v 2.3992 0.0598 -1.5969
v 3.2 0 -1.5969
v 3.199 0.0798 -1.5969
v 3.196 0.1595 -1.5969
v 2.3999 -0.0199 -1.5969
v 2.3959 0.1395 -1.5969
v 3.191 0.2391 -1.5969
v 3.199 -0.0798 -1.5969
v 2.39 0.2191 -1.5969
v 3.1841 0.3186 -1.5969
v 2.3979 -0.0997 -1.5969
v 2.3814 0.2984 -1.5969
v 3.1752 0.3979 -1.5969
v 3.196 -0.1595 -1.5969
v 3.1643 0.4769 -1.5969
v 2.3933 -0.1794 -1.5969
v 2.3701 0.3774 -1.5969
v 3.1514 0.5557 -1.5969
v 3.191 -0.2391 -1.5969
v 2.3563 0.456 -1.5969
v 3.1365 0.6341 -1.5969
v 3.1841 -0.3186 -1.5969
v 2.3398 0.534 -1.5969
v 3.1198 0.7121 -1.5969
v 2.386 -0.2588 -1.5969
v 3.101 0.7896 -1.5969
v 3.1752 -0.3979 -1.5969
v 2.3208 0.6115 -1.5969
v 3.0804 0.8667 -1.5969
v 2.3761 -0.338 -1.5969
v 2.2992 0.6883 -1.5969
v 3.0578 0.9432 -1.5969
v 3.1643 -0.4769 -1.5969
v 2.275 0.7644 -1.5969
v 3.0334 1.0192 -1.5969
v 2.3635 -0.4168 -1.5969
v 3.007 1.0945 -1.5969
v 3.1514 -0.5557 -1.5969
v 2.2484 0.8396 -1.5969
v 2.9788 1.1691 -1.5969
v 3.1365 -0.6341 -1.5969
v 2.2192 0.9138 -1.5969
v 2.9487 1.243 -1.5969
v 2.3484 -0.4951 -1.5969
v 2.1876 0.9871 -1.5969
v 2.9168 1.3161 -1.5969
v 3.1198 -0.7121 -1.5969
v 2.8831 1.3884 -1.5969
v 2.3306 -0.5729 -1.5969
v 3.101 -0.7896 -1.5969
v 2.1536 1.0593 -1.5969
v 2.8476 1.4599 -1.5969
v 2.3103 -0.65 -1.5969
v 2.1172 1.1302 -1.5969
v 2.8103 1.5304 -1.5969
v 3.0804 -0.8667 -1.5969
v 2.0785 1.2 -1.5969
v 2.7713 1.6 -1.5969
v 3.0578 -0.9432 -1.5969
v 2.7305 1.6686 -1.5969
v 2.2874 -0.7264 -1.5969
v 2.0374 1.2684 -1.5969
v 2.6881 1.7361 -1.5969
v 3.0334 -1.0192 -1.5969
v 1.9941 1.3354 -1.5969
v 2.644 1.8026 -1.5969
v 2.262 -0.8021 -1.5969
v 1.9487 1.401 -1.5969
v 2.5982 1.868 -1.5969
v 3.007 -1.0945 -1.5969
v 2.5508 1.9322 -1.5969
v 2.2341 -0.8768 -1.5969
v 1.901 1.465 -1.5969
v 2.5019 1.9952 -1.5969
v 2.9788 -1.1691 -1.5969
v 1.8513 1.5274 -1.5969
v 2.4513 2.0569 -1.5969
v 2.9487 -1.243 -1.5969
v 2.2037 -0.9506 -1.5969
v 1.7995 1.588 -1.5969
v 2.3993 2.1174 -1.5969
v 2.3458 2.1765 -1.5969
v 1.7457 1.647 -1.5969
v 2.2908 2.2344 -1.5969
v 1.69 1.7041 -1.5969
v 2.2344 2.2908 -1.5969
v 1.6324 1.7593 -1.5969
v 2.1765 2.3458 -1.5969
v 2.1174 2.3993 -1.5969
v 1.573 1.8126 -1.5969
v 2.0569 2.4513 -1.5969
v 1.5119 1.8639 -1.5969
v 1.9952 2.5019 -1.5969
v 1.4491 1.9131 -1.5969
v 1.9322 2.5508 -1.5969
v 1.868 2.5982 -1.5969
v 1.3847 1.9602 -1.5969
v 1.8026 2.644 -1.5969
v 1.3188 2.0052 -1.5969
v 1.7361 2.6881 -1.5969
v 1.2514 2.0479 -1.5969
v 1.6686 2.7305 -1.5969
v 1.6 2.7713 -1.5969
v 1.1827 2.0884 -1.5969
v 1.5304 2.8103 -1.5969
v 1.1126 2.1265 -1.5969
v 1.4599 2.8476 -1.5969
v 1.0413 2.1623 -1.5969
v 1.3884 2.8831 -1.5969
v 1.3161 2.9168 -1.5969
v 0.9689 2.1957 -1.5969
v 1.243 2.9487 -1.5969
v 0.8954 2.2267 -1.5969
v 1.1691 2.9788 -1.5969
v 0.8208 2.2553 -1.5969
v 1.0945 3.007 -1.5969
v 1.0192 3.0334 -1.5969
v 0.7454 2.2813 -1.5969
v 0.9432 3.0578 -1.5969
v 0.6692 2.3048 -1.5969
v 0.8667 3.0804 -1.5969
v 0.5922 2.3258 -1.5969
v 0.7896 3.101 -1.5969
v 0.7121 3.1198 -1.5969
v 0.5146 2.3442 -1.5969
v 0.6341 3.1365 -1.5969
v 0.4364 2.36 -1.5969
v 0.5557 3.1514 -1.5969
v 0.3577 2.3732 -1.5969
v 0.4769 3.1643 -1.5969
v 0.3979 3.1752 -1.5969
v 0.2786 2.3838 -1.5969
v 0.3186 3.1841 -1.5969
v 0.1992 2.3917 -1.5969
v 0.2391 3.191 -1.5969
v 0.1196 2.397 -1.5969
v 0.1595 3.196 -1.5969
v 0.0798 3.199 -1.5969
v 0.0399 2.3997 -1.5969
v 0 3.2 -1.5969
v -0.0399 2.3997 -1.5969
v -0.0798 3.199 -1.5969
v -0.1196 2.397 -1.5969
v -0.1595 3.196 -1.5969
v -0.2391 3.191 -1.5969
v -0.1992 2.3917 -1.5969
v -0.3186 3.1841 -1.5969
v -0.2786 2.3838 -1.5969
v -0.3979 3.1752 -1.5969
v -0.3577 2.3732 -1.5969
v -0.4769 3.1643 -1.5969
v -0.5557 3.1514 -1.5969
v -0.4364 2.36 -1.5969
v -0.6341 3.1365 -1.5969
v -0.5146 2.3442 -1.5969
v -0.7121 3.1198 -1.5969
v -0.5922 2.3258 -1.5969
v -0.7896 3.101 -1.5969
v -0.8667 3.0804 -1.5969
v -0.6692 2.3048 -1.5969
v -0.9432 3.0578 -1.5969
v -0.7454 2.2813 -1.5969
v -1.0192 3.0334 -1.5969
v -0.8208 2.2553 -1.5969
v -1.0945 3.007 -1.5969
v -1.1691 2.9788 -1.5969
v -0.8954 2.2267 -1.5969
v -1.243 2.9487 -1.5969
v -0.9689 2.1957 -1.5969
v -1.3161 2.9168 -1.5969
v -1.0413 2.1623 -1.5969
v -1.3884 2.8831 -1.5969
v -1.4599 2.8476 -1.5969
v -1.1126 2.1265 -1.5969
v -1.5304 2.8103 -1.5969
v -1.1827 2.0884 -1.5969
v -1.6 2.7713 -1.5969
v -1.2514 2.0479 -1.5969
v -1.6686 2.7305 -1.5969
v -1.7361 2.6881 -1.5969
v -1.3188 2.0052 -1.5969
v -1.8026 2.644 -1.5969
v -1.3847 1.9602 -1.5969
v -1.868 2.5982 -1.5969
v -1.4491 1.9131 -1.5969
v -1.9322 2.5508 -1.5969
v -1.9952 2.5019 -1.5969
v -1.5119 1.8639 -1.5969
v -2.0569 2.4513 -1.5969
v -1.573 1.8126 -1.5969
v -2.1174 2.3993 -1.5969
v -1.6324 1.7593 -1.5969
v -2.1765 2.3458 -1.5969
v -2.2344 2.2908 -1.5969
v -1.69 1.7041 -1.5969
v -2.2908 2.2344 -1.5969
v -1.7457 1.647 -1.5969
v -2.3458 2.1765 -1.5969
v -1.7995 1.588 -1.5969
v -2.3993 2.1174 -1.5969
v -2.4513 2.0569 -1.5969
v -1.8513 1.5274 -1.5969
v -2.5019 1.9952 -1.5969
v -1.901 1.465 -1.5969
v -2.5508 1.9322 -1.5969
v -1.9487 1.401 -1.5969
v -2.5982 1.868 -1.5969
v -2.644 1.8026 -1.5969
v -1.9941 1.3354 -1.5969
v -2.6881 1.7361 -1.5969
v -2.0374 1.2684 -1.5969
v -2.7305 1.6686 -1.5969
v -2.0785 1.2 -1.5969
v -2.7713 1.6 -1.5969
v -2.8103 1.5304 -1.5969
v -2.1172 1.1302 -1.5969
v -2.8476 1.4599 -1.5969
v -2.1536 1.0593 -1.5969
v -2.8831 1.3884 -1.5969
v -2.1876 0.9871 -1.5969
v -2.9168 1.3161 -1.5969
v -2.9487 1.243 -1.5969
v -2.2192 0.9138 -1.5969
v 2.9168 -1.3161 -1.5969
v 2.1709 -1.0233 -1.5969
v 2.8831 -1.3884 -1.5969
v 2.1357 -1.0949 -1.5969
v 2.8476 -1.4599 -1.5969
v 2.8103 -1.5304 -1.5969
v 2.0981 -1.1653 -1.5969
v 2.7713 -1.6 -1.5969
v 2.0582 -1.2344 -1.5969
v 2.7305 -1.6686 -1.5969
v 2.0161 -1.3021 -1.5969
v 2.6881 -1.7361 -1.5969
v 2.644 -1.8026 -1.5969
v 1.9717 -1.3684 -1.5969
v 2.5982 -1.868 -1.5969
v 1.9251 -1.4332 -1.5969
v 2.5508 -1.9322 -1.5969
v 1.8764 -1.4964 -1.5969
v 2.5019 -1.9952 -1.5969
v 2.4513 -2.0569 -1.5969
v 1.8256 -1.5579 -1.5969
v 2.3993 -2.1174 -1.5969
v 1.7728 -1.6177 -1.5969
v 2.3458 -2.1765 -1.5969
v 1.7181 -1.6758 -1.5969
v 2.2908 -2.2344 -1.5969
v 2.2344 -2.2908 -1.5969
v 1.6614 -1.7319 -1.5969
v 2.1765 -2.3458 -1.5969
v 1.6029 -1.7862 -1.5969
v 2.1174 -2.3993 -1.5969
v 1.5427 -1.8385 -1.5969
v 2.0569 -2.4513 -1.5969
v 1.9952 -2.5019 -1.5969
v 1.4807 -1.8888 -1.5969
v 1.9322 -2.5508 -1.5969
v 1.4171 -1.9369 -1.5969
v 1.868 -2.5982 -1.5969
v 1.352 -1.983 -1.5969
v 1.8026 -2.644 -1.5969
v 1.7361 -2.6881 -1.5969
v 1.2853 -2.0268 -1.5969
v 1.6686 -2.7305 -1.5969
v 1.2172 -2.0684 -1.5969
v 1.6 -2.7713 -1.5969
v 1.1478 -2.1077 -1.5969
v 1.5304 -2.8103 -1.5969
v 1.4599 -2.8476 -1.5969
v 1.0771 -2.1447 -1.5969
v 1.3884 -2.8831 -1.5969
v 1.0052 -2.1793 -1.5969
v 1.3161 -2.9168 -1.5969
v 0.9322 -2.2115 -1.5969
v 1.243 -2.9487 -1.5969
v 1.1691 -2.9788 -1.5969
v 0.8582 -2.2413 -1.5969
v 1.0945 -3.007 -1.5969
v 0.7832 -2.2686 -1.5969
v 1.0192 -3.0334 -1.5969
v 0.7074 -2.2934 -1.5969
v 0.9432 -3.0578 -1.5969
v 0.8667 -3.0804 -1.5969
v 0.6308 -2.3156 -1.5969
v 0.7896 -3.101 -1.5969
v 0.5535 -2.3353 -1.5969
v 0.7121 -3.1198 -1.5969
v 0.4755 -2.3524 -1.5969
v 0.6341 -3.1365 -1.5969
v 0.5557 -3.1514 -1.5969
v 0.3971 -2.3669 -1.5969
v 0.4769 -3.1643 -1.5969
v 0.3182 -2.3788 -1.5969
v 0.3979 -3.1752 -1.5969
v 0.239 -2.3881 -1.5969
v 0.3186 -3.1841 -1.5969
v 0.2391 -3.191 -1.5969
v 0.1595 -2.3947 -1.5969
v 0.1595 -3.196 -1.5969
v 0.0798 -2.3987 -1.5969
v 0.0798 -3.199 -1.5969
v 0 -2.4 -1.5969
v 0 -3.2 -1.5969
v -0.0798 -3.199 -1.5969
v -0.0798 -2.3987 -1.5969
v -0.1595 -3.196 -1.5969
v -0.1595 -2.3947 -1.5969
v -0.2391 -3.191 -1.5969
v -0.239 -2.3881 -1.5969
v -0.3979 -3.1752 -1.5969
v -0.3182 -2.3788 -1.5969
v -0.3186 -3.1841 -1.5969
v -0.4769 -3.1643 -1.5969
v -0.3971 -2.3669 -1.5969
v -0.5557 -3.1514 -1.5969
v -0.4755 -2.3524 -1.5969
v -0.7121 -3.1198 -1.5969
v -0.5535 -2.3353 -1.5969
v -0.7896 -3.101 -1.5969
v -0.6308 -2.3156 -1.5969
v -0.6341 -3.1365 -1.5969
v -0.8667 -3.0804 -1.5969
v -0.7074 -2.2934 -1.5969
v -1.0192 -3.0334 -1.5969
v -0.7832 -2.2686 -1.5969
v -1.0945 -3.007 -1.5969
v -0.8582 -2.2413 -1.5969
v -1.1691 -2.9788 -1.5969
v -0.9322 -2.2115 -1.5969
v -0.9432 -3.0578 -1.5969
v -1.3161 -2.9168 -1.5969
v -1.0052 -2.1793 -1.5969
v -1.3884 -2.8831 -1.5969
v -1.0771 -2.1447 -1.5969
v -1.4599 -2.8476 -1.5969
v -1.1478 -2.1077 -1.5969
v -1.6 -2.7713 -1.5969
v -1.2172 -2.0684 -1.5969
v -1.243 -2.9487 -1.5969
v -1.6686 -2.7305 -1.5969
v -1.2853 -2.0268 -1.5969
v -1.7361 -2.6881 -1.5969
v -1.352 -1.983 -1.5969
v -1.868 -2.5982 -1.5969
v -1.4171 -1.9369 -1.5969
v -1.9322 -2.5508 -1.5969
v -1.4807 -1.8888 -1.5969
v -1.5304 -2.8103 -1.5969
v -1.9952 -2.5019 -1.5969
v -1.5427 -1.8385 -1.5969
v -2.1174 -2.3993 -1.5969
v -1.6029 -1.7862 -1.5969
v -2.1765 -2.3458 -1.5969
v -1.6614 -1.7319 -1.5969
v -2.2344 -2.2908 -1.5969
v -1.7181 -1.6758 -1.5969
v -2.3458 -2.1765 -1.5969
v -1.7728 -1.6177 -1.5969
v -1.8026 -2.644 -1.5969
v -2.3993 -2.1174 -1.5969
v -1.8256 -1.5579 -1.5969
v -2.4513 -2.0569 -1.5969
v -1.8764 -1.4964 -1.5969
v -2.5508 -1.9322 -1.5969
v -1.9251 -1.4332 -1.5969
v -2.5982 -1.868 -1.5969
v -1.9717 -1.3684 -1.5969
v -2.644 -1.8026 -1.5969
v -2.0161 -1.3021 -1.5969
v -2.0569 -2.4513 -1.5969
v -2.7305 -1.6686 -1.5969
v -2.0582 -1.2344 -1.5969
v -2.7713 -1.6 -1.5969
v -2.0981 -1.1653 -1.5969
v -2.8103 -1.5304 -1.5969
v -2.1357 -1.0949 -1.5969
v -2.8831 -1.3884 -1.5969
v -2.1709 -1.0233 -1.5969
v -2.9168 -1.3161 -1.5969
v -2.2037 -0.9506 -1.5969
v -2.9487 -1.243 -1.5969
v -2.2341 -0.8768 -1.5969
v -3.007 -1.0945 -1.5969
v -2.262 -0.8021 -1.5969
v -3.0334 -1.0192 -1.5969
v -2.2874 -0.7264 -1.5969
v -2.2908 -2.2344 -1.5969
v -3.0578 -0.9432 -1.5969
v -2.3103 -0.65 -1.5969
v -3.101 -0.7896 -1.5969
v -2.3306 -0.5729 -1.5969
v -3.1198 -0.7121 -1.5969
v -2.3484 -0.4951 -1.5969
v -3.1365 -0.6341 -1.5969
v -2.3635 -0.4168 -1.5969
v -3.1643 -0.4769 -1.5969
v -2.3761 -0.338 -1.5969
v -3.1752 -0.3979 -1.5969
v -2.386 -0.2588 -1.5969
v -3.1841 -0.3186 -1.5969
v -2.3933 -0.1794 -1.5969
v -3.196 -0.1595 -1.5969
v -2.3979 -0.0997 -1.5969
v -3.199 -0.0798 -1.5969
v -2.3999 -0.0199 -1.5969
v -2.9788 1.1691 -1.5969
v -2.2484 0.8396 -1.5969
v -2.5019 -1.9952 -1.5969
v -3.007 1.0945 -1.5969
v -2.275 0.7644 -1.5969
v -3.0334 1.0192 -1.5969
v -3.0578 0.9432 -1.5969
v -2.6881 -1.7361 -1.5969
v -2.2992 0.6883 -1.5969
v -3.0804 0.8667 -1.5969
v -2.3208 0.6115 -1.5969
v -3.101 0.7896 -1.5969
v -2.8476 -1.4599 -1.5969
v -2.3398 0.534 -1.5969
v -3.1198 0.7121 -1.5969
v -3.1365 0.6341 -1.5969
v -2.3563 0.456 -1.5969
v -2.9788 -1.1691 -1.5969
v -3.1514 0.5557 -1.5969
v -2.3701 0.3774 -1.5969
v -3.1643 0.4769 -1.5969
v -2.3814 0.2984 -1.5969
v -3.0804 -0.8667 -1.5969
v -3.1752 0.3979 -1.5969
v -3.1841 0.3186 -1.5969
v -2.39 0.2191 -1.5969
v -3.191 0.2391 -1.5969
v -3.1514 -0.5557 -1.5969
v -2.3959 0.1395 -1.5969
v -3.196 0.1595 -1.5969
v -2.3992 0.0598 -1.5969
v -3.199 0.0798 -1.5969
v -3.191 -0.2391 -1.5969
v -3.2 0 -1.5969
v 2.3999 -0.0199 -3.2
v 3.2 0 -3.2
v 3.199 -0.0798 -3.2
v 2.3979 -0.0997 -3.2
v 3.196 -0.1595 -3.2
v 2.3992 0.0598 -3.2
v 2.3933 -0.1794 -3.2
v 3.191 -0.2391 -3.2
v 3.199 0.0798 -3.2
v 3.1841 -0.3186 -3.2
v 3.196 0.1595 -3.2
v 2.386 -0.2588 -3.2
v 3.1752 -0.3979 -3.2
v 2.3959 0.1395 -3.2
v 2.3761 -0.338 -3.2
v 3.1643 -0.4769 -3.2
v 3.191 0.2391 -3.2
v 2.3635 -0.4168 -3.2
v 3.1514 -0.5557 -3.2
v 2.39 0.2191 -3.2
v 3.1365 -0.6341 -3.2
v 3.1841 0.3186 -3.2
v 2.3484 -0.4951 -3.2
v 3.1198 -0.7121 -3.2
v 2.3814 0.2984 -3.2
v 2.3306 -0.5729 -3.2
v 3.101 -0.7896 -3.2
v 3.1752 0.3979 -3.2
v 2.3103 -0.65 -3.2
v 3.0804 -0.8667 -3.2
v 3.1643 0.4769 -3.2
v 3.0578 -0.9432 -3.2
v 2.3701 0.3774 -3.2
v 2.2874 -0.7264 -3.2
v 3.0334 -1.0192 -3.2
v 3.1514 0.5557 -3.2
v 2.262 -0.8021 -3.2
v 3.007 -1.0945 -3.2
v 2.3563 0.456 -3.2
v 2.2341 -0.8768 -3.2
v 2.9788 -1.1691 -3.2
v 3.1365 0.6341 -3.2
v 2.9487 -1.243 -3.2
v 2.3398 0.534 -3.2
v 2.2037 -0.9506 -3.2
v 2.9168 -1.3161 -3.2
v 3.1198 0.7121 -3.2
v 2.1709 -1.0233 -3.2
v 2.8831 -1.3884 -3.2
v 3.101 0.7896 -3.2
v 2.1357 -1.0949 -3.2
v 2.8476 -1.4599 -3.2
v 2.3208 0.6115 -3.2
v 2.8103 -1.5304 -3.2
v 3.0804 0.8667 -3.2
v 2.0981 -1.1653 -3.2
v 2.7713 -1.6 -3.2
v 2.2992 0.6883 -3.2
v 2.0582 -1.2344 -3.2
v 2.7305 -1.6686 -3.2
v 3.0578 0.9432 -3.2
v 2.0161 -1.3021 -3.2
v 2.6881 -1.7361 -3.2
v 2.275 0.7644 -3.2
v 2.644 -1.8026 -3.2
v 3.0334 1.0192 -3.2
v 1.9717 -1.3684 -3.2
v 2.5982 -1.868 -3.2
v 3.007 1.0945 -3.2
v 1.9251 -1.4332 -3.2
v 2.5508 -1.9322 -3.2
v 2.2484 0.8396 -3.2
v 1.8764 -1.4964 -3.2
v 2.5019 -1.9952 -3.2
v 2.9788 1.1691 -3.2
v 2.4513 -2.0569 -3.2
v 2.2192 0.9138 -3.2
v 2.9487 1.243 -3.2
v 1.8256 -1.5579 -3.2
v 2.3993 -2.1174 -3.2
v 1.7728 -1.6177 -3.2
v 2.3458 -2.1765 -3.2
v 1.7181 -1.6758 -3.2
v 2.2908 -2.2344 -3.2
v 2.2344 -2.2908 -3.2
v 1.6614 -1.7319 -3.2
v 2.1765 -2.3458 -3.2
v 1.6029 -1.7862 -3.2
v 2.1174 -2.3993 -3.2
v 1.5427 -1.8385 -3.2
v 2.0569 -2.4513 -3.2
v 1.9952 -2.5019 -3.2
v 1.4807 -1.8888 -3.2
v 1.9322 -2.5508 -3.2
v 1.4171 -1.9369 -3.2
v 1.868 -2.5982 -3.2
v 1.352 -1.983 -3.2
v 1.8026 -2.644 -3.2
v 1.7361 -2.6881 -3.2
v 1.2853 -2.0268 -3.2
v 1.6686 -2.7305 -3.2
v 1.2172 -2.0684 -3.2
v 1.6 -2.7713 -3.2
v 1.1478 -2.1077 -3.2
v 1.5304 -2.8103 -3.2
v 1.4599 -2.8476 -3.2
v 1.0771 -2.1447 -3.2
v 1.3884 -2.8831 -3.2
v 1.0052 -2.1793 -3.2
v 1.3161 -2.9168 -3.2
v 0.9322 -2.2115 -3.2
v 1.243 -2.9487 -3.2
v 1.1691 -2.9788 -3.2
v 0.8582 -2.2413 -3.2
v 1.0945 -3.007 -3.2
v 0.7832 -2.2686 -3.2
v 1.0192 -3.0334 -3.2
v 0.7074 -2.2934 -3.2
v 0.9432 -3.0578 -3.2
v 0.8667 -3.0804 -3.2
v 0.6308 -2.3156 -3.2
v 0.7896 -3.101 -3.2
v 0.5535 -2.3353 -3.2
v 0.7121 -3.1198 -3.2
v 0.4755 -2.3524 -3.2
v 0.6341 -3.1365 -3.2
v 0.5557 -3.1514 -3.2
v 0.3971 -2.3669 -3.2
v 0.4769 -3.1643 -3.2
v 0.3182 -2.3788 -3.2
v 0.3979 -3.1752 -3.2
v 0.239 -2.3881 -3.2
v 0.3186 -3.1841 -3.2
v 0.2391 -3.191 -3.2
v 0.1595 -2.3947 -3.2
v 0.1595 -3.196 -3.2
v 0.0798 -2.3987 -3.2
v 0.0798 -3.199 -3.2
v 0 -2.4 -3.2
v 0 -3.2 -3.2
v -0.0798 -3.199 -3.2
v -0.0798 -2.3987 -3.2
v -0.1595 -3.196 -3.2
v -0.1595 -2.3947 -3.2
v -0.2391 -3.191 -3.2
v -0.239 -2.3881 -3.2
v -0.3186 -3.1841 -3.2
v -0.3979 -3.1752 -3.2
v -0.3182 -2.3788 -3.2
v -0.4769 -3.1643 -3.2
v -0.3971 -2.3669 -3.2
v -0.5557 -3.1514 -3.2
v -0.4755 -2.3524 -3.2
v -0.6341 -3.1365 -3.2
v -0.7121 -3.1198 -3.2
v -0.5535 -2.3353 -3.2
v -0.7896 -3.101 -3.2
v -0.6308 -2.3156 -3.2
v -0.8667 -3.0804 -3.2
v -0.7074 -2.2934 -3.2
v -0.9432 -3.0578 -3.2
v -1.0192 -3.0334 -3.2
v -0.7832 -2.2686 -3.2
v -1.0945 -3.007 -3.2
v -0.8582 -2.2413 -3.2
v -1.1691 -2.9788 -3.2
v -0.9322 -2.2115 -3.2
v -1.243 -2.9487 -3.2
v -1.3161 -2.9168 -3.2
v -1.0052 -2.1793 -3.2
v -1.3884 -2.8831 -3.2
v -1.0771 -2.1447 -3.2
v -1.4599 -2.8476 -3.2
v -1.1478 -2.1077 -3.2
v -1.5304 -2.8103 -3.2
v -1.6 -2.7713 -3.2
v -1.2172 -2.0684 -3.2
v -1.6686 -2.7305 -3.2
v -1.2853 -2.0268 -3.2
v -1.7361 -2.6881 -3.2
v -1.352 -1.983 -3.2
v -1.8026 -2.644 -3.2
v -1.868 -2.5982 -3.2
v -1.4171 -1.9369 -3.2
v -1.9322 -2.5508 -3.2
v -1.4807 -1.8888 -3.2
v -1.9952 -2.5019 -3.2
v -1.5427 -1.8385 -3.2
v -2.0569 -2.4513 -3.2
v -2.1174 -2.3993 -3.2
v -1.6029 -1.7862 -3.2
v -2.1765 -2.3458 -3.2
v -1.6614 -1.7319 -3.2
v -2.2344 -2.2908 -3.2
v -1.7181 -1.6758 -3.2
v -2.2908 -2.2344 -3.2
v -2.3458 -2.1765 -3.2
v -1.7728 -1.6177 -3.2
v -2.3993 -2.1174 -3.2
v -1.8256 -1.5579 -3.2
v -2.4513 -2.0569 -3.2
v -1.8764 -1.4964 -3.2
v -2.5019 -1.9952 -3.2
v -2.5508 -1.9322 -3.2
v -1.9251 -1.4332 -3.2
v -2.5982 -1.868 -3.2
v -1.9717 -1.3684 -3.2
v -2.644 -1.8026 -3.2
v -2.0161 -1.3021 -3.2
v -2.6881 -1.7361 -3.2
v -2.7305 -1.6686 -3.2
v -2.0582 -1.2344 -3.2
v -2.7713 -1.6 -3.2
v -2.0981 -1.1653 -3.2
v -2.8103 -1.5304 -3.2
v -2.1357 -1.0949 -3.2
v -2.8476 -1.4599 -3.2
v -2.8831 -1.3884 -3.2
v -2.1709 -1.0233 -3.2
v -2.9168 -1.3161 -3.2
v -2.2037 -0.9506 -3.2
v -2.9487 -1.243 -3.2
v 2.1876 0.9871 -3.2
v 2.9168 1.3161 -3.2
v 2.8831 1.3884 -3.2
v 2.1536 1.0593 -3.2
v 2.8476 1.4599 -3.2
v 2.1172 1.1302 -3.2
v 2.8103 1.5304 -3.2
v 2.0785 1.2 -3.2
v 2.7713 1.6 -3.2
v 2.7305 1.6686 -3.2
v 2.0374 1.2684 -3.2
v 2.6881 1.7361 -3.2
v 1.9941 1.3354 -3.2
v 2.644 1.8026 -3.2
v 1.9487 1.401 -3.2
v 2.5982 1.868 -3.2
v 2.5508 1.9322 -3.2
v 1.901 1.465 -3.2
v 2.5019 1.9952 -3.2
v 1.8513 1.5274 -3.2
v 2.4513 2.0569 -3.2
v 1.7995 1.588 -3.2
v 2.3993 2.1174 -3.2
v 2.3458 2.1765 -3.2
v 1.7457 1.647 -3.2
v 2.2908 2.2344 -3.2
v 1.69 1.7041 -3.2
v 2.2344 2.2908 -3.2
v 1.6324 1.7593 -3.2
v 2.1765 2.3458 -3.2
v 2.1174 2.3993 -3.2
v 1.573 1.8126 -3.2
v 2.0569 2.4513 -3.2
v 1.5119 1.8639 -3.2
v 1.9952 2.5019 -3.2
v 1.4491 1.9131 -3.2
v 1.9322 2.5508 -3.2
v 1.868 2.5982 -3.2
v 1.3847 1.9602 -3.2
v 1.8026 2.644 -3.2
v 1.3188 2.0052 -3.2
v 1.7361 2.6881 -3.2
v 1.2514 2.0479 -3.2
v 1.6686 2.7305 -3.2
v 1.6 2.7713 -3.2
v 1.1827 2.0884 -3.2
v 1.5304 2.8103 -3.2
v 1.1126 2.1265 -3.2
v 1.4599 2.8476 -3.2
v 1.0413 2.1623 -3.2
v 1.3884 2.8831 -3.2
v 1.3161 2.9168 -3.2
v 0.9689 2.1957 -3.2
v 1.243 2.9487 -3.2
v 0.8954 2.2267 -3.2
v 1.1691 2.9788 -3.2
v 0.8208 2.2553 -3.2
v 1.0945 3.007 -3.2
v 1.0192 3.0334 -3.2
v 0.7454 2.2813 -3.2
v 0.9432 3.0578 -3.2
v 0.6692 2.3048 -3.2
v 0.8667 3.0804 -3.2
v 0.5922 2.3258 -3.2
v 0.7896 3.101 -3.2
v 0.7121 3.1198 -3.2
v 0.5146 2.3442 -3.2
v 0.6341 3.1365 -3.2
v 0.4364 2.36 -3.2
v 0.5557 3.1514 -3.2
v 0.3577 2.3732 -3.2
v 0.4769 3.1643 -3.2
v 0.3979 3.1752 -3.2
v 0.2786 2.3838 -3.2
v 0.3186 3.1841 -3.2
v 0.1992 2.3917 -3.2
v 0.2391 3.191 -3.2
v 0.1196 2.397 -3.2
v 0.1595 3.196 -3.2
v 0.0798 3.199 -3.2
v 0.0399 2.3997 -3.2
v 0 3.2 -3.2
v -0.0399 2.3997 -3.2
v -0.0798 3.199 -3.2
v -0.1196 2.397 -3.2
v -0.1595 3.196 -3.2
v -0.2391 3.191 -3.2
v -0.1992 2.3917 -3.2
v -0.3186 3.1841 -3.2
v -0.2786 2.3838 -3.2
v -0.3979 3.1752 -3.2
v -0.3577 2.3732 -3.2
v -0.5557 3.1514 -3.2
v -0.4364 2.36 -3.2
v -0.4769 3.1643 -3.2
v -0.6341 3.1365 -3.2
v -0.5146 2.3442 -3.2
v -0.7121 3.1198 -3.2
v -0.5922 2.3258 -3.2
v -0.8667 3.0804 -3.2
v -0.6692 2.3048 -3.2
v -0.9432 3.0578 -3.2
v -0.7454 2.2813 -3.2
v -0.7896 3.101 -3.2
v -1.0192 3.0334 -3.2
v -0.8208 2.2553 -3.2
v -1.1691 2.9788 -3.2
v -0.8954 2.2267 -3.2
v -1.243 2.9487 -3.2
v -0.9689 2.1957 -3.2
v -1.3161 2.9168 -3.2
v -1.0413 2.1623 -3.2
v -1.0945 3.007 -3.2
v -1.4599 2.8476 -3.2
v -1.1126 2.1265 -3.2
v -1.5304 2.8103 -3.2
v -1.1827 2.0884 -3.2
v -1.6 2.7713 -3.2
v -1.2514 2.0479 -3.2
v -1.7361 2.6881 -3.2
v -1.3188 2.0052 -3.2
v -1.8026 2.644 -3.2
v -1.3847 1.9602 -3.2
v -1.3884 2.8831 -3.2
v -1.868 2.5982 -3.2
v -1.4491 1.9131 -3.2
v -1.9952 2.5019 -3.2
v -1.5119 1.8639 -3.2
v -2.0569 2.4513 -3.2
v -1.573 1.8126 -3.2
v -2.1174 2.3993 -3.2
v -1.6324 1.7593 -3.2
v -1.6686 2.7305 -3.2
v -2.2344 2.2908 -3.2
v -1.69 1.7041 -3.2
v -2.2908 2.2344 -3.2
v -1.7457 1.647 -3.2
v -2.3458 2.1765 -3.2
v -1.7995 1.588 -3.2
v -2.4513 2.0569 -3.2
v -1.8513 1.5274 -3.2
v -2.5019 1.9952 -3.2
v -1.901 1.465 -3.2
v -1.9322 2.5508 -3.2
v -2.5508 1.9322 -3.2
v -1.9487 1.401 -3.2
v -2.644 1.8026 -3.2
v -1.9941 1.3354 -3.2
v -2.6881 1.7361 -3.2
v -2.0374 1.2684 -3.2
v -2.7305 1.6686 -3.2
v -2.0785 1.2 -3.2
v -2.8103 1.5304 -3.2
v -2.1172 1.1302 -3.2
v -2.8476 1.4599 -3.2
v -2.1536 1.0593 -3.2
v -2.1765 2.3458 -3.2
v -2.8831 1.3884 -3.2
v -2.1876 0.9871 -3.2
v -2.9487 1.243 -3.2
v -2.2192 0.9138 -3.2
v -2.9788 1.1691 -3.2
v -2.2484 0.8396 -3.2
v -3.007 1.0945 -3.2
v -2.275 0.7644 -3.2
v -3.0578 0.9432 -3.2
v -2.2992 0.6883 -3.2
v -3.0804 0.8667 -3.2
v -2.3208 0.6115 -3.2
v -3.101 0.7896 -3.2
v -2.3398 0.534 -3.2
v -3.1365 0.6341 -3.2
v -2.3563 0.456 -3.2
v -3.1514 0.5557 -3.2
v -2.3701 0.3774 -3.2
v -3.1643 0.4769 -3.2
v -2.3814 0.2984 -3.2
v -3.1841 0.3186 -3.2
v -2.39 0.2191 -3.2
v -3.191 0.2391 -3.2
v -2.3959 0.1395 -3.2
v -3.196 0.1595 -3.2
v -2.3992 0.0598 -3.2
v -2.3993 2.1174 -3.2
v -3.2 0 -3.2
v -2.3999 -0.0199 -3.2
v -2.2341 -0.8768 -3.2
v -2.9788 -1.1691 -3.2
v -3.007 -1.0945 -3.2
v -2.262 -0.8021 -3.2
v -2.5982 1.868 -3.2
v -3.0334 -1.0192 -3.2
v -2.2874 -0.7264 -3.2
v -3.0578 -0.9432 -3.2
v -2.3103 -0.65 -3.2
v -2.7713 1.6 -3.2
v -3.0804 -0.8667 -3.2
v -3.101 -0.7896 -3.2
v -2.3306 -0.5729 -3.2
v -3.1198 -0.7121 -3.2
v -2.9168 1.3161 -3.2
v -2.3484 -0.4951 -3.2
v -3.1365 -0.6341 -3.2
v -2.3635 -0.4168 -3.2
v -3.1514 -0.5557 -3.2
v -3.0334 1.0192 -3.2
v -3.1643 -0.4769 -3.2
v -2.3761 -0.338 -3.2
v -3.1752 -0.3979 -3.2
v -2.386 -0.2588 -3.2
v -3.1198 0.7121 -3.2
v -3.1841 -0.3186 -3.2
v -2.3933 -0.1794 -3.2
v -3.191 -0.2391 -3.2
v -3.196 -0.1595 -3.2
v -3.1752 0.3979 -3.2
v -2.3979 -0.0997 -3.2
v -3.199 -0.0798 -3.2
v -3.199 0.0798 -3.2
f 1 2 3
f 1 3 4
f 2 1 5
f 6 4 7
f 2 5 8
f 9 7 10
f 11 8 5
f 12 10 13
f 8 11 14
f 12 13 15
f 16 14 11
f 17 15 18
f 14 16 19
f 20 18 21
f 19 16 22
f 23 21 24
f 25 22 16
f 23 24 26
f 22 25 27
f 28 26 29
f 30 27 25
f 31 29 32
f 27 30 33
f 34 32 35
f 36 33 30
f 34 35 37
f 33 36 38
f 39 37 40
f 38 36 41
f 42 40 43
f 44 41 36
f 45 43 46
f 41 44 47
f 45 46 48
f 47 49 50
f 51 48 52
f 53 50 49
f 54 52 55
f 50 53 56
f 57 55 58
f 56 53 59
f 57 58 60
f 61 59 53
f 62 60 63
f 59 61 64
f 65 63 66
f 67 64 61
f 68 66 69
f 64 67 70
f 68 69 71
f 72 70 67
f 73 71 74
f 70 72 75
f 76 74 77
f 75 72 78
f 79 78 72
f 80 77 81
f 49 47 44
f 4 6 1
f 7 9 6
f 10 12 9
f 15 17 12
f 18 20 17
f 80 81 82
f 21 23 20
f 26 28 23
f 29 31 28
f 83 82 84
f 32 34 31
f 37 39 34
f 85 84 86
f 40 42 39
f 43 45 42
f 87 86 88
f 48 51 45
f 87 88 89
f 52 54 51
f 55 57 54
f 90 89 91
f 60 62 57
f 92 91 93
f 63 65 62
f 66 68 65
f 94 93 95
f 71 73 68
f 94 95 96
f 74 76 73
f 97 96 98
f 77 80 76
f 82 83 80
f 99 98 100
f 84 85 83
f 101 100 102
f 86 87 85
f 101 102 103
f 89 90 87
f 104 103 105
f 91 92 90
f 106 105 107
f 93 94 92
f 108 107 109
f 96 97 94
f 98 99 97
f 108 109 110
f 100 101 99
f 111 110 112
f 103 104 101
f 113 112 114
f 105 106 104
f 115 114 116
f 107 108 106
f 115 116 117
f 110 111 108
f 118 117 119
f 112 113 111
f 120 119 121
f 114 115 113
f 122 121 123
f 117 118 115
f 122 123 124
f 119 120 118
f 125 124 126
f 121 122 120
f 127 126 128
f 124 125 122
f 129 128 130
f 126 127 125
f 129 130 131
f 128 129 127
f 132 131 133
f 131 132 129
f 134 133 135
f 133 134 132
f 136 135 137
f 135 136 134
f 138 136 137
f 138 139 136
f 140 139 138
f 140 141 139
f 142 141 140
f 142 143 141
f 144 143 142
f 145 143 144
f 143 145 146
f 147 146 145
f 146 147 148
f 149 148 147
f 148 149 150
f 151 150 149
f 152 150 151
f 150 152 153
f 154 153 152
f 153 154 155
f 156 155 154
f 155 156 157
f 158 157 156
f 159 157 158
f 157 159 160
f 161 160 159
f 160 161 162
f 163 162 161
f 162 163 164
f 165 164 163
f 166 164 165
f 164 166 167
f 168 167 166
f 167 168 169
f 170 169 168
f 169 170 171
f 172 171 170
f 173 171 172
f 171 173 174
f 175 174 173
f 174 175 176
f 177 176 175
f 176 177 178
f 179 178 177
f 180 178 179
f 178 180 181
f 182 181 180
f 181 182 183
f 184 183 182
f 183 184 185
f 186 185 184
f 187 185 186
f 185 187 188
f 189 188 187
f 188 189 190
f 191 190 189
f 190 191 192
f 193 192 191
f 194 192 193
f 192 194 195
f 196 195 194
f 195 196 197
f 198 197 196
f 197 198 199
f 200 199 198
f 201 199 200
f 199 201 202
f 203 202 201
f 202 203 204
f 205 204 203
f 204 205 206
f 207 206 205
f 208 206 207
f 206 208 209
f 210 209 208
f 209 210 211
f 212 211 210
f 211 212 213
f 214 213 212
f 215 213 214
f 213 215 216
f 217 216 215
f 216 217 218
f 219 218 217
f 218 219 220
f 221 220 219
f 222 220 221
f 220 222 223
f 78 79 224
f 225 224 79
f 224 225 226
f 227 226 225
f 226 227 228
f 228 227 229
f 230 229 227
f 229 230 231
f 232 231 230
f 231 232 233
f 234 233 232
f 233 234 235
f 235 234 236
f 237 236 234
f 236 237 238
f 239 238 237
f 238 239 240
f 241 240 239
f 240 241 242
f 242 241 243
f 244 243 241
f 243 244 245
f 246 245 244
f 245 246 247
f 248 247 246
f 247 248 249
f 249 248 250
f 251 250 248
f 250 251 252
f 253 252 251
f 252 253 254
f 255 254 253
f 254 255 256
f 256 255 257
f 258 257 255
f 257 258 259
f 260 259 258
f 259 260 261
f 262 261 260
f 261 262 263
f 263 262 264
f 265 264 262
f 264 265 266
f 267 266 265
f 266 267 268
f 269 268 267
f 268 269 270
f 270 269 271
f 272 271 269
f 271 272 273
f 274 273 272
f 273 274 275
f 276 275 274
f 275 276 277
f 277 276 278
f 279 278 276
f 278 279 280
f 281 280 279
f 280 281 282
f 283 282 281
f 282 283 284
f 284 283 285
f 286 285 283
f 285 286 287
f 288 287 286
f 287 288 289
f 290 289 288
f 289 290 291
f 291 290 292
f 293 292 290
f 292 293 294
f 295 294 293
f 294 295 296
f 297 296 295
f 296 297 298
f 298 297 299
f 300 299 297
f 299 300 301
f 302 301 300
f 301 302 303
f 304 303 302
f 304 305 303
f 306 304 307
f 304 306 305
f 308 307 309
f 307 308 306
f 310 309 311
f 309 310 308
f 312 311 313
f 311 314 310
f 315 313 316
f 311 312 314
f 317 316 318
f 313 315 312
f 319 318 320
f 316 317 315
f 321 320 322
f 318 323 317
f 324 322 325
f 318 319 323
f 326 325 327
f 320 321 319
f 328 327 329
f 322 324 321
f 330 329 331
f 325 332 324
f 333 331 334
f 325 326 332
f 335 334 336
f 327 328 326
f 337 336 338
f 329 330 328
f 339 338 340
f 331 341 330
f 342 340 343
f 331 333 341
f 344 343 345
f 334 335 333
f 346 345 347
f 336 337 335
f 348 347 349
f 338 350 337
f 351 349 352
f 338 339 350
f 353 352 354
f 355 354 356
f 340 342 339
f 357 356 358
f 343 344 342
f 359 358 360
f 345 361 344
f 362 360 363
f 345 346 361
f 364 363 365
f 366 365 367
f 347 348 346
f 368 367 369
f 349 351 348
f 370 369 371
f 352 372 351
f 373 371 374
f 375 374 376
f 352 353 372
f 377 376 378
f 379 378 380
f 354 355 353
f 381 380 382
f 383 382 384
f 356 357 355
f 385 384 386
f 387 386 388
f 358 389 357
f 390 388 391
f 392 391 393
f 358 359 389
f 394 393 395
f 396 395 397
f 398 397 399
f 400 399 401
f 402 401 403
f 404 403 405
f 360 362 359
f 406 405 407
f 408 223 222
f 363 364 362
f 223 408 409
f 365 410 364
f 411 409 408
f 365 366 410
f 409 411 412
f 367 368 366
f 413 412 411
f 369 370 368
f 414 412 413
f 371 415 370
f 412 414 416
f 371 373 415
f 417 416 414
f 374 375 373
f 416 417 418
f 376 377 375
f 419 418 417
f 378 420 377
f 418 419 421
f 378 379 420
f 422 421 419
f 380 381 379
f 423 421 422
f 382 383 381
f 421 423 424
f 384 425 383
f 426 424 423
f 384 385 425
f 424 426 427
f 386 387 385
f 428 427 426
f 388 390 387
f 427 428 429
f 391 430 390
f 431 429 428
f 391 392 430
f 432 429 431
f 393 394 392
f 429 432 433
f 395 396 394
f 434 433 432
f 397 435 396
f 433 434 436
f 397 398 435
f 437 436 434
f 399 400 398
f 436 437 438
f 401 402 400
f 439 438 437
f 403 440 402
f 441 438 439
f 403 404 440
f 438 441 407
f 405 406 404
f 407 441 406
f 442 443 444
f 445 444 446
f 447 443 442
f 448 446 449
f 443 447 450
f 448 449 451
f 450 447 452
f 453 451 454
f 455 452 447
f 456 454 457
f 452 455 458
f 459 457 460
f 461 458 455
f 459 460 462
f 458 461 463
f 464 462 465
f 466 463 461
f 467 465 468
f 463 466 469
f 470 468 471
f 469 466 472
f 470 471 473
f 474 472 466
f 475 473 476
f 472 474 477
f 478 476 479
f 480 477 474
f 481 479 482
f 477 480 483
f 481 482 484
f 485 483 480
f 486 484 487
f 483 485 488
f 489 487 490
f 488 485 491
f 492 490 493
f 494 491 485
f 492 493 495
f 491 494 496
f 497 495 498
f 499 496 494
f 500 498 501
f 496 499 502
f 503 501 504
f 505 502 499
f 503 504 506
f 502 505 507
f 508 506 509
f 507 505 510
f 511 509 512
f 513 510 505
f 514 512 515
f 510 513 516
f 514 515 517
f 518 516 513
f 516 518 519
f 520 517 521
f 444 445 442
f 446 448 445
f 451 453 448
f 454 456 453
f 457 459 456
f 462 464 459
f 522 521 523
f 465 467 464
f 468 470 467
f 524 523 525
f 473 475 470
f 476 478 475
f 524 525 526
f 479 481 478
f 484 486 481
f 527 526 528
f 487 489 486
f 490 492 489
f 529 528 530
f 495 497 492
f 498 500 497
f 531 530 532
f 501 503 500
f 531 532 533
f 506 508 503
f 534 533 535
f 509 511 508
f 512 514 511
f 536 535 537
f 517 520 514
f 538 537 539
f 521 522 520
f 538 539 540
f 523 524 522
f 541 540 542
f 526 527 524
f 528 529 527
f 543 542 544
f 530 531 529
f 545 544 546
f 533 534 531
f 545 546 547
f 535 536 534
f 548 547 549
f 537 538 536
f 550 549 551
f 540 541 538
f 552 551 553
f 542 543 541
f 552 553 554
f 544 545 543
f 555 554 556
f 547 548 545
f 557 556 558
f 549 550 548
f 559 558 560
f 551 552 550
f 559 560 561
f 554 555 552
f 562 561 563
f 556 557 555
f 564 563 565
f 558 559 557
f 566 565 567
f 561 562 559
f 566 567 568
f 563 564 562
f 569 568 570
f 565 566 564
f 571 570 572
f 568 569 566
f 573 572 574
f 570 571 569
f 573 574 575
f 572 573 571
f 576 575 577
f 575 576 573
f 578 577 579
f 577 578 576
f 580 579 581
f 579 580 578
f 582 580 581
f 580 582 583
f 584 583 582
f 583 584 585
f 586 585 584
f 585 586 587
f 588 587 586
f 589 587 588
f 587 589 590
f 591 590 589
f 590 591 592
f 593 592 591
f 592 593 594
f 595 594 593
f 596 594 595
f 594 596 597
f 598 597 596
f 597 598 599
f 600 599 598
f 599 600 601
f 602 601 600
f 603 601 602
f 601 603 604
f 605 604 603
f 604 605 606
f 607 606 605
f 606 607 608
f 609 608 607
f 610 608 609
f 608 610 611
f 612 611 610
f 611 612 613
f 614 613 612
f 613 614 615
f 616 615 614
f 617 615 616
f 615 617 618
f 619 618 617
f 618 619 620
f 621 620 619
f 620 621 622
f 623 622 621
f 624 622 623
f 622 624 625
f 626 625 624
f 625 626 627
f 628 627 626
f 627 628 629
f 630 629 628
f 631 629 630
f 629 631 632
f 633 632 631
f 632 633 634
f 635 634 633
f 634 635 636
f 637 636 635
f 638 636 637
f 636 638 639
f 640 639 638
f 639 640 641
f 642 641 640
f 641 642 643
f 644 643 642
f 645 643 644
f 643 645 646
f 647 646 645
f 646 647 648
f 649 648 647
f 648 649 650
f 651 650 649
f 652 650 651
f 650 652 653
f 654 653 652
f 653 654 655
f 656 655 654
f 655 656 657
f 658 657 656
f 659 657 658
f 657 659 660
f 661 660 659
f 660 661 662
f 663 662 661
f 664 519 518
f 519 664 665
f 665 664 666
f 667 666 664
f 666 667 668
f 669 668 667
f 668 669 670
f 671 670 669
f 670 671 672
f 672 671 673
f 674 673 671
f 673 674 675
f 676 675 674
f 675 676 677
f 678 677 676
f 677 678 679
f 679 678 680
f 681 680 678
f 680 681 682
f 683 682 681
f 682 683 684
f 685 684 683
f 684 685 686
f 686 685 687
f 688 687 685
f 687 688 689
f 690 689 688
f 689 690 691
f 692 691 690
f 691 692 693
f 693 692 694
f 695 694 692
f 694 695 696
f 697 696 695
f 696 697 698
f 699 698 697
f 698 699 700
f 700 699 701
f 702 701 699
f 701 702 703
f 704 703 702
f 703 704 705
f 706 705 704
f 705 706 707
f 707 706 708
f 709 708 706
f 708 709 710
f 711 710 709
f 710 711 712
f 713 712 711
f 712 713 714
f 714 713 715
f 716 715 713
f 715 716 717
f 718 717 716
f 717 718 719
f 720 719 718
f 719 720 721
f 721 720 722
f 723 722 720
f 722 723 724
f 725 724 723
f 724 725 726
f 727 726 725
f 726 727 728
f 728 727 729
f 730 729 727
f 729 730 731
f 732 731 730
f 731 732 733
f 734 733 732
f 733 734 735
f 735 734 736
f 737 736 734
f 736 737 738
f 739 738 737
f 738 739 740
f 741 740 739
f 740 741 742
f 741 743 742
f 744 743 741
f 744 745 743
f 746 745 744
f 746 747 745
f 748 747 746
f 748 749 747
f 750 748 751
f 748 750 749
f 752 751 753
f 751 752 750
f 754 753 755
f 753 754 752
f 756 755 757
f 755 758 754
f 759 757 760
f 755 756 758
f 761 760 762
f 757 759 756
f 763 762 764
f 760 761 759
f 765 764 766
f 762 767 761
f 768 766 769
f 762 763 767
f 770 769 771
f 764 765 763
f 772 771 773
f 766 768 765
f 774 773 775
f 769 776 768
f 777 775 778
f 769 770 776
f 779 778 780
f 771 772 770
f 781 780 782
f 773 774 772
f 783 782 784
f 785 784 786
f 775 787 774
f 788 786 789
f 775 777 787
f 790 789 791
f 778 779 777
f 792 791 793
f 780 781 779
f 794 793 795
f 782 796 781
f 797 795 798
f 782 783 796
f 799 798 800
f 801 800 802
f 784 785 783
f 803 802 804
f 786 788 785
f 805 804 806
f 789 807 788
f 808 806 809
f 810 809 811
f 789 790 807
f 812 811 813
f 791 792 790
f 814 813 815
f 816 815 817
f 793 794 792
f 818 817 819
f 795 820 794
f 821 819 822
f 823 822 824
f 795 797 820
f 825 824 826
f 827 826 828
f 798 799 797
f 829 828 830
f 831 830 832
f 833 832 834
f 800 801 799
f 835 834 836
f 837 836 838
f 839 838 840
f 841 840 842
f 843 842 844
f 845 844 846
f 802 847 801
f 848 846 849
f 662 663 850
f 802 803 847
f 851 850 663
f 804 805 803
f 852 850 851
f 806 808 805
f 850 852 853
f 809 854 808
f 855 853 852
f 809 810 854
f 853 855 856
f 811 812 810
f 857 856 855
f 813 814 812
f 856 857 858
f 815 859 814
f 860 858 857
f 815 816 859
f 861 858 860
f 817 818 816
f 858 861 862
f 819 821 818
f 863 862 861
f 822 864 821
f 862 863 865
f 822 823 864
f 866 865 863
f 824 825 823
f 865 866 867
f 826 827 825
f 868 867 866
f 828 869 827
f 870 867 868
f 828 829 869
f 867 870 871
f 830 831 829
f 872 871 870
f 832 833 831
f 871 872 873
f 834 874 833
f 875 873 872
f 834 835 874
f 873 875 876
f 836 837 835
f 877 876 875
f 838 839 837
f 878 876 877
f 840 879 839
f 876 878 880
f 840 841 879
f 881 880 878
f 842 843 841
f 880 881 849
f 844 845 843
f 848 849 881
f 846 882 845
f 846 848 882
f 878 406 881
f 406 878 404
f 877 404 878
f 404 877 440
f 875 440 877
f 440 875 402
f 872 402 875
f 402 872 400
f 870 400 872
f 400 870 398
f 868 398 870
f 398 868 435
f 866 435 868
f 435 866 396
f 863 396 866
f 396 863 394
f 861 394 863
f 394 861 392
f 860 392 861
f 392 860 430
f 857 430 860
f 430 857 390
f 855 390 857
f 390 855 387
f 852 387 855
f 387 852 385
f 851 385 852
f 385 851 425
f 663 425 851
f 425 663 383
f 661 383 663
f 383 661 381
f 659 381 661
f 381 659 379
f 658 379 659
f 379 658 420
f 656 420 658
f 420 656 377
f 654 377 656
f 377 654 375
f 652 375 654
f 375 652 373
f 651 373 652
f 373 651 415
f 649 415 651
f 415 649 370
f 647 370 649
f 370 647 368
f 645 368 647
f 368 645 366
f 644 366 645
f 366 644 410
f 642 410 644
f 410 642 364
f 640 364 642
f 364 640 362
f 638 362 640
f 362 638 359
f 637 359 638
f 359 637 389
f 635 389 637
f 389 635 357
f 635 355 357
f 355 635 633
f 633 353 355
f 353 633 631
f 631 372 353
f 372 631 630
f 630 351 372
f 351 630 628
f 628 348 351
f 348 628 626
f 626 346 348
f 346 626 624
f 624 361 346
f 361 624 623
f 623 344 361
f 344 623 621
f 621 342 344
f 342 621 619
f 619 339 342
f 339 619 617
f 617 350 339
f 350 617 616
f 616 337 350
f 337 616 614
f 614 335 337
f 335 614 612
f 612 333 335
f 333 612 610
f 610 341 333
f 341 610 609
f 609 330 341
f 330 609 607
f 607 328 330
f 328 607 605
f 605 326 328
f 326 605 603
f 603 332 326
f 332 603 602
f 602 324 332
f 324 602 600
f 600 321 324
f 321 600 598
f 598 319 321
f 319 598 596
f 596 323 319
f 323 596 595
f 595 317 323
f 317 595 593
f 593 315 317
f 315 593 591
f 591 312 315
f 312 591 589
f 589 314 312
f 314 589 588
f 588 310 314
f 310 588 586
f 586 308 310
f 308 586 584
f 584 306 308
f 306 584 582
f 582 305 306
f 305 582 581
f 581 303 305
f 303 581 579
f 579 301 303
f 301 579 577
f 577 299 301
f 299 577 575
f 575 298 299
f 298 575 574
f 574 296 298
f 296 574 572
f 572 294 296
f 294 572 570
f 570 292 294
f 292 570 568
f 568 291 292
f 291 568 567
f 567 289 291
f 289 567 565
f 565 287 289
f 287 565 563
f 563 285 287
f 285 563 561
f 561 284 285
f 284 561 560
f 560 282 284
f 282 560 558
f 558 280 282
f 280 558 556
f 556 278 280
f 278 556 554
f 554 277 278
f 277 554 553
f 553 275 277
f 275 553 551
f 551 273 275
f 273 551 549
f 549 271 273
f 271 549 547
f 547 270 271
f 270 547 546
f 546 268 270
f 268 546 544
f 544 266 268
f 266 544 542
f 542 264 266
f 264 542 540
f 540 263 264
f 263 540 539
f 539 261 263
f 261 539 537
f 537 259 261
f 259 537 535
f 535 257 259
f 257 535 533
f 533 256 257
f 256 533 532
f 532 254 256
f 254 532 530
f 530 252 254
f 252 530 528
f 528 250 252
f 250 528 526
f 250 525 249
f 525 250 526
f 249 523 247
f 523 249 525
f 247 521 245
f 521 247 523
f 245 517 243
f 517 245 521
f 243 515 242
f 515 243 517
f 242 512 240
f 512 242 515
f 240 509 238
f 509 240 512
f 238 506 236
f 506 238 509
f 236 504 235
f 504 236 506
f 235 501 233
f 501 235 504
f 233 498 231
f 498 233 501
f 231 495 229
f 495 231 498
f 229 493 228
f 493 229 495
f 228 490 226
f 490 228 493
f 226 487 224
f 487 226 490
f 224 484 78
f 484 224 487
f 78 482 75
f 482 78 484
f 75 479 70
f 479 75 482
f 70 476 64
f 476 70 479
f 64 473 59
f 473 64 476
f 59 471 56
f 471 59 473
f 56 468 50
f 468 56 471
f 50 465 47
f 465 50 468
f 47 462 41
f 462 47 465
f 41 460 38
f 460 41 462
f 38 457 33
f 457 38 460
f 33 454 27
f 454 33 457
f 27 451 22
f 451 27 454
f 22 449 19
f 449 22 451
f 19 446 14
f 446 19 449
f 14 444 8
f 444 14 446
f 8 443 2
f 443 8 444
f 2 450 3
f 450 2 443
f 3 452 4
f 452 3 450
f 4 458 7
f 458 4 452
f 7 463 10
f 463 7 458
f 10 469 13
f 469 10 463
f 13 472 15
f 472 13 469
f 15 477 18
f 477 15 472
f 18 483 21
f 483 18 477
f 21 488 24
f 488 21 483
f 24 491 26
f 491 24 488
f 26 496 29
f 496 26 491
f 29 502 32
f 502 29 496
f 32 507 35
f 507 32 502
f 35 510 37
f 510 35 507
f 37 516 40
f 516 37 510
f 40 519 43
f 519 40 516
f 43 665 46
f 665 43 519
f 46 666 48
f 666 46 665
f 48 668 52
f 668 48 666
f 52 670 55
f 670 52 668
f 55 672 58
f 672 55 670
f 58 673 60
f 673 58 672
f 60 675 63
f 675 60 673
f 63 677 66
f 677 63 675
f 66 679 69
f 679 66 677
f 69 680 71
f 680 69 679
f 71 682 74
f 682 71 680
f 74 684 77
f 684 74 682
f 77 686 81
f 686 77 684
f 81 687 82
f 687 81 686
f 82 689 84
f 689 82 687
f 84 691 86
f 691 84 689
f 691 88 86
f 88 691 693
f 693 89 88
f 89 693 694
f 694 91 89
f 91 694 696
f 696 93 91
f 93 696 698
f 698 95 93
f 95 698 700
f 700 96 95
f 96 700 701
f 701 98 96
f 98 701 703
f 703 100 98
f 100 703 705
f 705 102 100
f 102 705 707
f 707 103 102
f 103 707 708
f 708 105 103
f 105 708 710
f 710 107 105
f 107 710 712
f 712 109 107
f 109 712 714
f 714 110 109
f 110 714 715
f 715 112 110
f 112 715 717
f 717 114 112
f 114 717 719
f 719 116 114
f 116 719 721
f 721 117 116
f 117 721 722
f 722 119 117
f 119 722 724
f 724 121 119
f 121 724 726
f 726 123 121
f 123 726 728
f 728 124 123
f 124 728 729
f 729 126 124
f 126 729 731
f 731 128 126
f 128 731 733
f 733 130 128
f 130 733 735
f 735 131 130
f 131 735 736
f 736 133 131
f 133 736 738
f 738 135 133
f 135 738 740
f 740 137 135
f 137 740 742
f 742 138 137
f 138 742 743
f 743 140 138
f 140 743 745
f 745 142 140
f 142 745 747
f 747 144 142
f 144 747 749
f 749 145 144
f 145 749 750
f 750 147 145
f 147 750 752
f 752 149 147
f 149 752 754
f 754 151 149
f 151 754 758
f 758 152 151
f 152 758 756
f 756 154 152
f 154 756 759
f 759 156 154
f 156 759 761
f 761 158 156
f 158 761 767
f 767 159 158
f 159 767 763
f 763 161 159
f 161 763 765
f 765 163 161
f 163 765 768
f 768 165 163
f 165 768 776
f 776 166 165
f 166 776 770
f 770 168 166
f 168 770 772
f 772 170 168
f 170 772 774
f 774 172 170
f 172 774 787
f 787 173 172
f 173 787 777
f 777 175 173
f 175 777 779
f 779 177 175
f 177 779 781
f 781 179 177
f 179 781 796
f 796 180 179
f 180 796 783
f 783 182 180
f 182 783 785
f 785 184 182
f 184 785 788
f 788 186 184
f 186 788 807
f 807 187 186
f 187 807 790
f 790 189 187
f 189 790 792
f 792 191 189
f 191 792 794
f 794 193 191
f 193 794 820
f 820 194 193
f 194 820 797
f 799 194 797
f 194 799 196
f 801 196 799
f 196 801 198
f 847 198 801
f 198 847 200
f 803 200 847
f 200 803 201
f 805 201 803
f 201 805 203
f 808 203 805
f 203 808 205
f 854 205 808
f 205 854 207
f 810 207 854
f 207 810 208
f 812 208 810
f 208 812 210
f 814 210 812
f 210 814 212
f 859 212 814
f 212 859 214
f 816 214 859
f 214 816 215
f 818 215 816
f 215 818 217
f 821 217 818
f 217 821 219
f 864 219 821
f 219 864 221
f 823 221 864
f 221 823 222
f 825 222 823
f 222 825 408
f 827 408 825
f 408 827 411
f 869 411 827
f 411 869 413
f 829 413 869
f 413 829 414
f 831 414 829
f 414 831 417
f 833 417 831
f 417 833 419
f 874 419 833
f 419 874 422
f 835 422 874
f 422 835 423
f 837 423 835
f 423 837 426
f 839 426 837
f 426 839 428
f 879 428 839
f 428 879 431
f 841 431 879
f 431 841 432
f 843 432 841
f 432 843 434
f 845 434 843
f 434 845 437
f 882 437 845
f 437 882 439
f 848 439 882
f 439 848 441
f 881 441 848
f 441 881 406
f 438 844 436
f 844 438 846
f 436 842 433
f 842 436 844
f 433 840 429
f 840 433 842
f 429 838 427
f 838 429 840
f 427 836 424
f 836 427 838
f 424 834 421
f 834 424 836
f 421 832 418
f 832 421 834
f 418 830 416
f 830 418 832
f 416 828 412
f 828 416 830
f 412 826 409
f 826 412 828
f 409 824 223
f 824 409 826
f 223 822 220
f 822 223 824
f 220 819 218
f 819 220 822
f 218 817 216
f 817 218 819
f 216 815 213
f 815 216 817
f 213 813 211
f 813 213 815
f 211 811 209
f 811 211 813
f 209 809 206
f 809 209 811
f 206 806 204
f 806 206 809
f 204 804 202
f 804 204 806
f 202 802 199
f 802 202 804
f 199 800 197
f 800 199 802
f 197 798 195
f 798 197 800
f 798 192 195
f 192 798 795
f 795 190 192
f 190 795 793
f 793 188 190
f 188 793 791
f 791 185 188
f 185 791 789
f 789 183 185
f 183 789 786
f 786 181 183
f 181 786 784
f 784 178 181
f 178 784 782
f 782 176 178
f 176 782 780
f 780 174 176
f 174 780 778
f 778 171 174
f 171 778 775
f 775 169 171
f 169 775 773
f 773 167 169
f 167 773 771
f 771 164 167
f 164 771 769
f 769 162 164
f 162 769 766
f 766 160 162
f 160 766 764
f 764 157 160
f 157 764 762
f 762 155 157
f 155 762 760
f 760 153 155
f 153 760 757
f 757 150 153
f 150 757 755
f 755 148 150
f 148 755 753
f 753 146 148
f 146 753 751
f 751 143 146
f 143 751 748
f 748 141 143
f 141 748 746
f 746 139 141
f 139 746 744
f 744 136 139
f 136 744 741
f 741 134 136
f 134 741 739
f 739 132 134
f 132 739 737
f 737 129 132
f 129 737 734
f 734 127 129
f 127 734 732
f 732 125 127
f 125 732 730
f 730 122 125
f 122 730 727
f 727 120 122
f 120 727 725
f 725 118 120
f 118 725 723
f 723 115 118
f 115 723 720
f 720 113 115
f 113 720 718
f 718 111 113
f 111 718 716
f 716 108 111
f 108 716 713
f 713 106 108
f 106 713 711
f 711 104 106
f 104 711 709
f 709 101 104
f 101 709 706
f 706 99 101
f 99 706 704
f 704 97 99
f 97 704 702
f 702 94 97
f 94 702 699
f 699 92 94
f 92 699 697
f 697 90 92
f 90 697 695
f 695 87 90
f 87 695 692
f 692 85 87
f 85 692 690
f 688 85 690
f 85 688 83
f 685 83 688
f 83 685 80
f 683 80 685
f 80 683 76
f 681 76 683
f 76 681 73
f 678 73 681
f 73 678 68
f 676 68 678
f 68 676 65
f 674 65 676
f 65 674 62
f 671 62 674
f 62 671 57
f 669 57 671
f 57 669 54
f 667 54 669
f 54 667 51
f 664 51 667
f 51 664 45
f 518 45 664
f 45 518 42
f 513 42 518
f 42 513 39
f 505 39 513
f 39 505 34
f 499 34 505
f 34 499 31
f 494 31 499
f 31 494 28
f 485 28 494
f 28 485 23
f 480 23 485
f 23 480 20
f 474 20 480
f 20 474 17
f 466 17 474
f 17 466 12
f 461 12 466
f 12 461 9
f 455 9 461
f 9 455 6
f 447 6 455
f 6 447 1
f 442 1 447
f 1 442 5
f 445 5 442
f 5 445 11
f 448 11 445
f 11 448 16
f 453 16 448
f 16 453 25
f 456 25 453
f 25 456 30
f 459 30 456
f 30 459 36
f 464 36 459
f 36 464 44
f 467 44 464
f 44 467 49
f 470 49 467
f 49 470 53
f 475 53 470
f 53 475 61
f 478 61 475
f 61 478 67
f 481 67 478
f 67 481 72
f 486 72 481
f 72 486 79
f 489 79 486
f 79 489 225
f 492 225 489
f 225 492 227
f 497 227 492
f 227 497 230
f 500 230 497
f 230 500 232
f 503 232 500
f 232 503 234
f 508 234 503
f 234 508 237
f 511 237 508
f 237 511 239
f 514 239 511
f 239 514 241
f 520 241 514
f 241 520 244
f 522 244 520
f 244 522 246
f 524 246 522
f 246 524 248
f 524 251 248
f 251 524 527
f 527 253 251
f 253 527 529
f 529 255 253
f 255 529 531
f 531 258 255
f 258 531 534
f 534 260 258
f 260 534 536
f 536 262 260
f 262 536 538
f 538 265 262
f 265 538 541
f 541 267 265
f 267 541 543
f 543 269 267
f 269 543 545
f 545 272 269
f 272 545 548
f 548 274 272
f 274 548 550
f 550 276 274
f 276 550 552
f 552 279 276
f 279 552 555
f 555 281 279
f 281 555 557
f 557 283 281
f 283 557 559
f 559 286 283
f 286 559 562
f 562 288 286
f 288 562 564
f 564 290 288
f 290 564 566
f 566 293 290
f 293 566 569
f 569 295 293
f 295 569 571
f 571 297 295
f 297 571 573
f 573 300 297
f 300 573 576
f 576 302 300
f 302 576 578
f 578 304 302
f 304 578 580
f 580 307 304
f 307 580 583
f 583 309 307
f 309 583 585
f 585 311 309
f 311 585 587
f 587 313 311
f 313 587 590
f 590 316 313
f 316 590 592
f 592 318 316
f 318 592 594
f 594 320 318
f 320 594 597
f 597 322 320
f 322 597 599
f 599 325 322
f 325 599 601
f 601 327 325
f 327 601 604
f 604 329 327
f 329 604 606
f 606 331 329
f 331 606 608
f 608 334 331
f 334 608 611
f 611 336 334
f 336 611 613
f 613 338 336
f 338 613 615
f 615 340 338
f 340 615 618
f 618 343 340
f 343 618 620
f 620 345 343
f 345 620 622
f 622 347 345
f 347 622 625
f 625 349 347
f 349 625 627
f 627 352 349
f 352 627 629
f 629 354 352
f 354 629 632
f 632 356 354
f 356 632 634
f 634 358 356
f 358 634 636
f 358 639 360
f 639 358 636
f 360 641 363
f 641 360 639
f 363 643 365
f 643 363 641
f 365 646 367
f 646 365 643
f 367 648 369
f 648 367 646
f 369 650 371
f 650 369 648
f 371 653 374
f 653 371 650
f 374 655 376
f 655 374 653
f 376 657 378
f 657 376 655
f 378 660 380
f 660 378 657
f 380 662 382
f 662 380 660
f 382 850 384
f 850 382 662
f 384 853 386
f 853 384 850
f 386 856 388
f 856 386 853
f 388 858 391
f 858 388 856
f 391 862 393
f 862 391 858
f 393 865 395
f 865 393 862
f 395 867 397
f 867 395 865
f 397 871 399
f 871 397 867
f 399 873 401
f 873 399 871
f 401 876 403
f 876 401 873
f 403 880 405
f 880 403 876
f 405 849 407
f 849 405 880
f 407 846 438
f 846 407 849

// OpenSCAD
use <../lib.scad>
use <3068b.scad>
use <6005724e2.scad>
$fa=1; $fs=0.2;
function ldraw_lib__3068bdm1(realsolid=false) = [
// 0 Tile  2 x  2 with Wood Grain and Nails Type 2 Sticker
// 0 Name: 3068bdm1.dat
// 0 Author: Christian Neumann [Wesley]
// 0 !LDRAW_ORG Shortcut UPDATE 2014-02
// 0 !LICENSE Licensed under CC BY 2.0 and CC BY 4.0 : see CAreadme.txt
// 
// 0 BFC CERTIFY CCW
  [0,"BFC","CERTIFY"],
  [0,"BFC","CCW"],
// 
// 0 !KEYWORDS Lord of the Rings, LOTR, Mines of Moria, Set 9473
// 
// 0 !CMDLINE -c70
// 
// 0 !HISTORY 2014-12-23 [PTadmin] Official Update 2014-02
// 
// 
// 1 16 0 0 0 1 0 0 0 1 0 0 0 1 3068b.dat
  [1,16,0,0,0,1,0,0,0,1,0,0,0,1, ldraw_lib__3068b(realsolid)],
// 1 16 0 0 0 1 0 0 0 1 0 0 0 1 6005724e2.dat
  [1,16,0,0,0,1,0,0,0,1,0,0,0,1, ldraw_lib__6005724e2(realsolid)],
];
module ldraw_lib__3068bdm1(step=0, col=false, unit=2/5, alt=false, line=0.2, solid=!$preview)
    makepoly(ldraw_lib__3068bdm1(solid), step=step, col=col, unit=unit, alt=alt, line=line, solid=solid);
ldraw_lib__3068bdm1(line=0.2);
